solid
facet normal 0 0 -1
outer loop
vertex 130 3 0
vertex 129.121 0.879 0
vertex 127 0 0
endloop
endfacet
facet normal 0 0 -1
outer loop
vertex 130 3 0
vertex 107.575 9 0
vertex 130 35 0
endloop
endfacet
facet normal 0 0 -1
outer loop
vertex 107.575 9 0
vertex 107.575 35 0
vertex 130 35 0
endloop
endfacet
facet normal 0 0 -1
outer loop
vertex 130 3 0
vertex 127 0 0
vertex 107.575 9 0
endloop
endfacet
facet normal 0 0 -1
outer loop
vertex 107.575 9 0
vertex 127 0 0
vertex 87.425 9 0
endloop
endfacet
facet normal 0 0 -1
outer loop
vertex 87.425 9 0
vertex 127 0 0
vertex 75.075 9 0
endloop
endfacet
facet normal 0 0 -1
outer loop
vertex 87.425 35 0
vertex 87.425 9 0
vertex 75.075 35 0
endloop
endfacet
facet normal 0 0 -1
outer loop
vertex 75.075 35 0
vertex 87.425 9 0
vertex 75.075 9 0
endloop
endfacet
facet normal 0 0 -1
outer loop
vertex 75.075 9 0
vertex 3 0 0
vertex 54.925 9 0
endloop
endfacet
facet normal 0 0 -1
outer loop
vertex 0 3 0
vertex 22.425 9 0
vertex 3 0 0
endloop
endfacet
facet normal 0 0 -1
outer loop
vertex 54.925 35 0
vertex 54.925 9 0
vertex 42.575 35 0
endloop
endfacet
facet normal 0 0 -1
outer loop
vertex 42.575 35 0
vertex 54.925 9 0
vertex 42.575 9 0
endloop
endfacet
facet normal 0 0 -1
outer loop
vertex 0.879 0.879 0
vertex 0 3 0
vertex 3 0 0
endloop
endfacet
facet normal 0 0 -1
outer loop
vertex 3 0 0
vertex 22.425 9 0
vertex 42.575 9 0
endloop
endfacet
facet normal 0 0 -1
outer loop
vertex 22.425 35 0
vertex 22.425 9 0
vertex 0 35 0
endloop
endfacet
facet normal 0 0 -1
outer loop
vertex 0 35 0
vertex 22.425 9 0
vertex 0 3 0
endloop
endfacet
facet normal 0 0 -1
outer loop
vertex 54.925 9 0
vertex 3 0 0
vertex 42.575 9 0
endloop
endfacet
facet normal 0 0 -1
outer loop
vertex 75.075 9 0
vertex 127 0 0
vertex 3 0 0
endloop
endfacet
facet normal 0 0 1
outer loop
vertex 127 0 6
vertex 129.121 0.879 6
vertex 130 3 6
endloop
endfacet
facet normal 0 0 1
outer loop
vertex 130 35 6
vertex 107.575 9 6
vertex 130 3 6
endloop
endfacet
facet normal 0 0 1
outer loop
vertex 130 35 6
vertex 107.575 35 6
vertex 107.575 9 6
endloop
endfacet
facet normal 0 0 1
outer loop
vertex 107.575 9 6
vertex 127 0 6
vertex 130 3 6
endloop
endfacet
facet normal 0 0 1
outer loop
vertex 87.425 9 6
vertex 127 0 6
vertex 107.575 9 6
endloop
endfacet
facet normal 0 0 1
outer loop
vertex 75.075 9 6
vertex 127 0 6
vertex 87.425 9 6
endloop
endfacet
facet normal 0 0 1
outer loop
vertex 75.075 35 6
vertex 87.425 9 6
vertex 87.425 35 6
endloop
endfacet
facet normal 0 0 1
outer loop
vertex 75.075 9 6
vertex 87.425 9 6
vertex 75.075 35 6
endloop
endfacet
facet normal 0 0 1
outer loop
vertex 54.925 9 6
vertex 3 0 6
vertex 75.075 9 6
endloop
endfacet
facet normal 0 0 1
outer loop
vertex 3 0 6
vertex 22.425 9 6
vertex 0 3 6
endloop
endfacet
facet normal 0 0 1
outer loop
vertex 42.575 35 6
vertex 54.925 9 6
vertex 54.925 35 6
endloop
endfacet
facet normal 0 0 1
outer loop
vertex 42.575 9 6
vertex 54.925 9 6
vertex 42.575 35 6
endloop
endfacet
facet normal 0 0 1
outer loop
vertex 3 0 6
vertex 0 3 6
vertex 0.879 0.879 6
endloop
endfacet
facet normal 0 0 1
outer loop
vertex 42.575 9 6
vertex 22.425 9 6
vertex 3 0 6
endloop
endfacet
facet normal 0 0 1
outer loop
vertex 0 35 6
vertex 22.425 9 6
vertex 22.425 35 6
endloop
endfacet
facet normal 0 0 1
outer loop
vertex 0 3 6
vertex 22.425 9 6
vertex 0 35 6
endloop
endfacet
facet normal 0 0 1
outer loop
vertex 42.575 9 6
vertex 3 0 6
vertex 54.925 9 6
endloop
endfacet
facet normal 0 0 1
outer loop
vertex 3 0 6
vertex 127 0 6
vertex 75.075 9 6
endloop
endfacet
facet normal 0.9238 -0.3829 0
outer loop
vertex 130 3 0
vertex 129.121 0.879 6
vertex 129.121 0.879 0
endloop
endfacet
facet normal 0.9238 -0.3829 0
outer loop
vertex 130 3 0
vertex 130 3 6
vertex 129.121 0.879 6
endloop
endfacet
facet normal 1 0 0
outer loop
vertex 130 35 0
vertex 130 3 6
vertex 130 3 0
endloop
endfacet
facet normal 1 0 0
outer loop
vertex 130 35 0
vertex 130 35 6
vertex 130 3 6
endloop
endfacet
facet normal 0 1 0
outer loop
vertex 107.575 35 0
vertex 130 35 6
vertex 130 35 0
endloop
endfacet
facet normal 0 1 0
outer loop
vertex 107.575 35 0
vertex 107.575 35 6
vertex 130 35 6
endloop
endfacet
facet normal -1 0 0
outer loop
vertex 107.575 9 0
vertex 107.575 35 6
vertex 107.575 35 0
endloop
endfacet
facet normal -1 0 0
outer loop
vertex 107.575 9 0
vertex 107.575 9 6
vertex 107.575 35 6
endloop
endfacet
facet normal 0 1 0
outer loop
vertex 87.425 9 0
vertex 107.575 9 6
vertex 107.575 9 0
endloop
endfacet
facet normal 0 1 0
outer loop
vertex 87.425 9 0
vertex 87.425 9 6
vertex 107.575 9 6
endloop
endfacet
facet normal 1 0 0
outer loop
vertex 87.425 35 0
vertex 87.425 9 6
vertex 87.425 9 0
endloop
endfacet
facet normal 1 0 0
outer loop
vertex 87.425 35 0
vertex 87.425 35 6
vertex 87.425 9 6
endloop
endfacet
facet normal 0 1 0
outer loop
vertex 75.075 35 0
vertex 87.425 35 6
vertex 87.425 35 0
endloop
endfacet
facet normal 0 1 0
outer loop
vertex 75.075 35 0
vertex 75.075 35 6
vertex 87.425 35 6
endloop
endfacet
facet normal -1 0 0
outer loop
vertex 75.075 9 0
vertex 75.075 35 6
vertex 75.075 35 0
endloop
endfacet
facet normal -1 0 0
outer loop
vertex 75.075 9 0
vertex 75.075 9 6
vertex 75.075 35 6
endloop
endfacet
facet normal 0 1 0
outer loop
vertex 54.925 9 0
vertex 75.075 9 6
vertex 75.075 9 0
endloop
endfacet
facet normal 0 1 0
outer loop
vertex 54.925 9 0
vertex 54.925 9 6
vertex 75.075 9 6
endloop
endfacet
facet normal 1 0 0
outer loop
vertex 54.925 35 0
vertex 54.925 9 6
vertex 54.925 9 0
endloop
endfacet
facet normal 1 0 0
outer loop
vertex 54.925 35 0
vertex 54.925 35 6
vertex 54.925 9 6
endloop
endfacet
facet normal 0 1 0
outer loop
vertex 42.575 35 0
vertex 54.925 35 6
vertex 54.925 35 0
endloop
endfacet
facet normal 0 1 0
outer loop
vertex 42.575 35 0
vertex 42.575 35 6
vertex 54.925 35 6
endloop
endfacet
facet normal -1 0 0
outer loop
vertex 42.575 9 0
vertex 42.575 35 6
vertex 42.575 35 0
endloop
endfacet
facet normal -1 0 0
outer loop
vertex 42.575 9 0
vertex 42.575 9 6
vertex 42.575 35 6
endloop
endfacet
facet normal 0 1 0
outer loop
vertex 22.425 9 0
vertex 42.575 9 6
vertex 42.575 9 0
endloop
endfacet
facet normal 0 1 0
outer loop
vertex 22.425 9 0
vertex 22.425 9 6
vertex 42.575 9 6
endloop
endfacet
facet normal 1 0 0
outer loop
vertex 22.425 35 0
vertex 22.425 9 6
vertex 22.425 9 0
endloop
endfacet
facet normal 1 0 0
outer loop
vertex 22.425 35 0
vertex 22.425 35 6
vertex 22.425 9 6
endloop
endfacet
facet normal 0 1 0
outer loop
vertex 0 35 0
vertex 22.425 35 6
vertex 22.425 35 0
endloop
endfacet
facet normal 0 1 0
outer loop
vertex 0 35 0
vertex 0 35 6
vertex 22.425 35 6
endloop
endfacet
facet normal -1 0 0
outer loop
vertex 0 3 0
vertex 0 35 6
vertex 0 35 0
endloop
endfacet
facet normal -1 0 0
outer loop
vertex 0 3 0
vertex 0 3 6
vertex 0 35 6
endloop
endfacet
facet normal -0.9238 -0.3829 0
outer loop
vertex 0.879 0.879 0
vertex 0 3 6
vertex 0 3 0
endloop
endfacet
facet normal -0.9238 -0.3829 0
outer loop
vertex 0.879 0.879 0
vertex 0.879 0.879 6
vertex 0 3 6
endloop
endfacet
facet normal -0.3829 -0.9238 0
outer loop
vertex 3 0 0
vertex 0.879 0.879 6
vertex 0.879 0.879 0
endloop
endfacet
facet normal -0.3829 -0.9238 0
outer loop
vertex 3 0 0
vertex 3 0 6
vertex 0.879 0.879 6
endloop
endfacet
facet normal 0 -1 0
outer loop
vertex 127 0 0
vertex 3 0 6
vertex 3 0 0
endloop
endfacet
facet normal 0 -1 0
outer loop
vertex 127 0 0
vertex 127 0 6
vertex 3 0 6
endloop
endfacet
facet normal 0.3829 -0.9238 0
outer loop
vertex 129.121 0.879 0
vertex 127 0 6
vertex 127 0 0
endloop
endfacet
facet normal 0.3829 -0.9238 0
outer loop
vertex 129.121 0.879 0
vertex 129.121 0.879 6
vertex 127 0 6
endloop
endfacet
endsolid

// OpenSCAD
$fn = 32;

// ----------------------------------------------------------------------
// Window plate: 130 x 35 mm, 3 open windows
// ----------------------------------------------------------------------

// --- parameters (mm) ---
profile_height = 6;       // extrusion height
profile_points = 20;      // points of the closed outline

profile = [[0, 3], [0.879, 0.879], [3, 0], [127, 0], [129.121, 0.879], [130, 3], [130, 35], [107.575, 35], [107.575, 9], [87.425, 9], [87.425, 35], [75.075, 35], [75.075, 9], [54.925, 9], [54.925, 35], [42.575, 35], [42.575, 9], [22.425, 9], [22.425, 35], [0, 35]];  // single closed polygon, 20 points, counter clockwise

// --- the one profile operation ---
linear_extrude(height = profile_height) polygon(points = profile);
